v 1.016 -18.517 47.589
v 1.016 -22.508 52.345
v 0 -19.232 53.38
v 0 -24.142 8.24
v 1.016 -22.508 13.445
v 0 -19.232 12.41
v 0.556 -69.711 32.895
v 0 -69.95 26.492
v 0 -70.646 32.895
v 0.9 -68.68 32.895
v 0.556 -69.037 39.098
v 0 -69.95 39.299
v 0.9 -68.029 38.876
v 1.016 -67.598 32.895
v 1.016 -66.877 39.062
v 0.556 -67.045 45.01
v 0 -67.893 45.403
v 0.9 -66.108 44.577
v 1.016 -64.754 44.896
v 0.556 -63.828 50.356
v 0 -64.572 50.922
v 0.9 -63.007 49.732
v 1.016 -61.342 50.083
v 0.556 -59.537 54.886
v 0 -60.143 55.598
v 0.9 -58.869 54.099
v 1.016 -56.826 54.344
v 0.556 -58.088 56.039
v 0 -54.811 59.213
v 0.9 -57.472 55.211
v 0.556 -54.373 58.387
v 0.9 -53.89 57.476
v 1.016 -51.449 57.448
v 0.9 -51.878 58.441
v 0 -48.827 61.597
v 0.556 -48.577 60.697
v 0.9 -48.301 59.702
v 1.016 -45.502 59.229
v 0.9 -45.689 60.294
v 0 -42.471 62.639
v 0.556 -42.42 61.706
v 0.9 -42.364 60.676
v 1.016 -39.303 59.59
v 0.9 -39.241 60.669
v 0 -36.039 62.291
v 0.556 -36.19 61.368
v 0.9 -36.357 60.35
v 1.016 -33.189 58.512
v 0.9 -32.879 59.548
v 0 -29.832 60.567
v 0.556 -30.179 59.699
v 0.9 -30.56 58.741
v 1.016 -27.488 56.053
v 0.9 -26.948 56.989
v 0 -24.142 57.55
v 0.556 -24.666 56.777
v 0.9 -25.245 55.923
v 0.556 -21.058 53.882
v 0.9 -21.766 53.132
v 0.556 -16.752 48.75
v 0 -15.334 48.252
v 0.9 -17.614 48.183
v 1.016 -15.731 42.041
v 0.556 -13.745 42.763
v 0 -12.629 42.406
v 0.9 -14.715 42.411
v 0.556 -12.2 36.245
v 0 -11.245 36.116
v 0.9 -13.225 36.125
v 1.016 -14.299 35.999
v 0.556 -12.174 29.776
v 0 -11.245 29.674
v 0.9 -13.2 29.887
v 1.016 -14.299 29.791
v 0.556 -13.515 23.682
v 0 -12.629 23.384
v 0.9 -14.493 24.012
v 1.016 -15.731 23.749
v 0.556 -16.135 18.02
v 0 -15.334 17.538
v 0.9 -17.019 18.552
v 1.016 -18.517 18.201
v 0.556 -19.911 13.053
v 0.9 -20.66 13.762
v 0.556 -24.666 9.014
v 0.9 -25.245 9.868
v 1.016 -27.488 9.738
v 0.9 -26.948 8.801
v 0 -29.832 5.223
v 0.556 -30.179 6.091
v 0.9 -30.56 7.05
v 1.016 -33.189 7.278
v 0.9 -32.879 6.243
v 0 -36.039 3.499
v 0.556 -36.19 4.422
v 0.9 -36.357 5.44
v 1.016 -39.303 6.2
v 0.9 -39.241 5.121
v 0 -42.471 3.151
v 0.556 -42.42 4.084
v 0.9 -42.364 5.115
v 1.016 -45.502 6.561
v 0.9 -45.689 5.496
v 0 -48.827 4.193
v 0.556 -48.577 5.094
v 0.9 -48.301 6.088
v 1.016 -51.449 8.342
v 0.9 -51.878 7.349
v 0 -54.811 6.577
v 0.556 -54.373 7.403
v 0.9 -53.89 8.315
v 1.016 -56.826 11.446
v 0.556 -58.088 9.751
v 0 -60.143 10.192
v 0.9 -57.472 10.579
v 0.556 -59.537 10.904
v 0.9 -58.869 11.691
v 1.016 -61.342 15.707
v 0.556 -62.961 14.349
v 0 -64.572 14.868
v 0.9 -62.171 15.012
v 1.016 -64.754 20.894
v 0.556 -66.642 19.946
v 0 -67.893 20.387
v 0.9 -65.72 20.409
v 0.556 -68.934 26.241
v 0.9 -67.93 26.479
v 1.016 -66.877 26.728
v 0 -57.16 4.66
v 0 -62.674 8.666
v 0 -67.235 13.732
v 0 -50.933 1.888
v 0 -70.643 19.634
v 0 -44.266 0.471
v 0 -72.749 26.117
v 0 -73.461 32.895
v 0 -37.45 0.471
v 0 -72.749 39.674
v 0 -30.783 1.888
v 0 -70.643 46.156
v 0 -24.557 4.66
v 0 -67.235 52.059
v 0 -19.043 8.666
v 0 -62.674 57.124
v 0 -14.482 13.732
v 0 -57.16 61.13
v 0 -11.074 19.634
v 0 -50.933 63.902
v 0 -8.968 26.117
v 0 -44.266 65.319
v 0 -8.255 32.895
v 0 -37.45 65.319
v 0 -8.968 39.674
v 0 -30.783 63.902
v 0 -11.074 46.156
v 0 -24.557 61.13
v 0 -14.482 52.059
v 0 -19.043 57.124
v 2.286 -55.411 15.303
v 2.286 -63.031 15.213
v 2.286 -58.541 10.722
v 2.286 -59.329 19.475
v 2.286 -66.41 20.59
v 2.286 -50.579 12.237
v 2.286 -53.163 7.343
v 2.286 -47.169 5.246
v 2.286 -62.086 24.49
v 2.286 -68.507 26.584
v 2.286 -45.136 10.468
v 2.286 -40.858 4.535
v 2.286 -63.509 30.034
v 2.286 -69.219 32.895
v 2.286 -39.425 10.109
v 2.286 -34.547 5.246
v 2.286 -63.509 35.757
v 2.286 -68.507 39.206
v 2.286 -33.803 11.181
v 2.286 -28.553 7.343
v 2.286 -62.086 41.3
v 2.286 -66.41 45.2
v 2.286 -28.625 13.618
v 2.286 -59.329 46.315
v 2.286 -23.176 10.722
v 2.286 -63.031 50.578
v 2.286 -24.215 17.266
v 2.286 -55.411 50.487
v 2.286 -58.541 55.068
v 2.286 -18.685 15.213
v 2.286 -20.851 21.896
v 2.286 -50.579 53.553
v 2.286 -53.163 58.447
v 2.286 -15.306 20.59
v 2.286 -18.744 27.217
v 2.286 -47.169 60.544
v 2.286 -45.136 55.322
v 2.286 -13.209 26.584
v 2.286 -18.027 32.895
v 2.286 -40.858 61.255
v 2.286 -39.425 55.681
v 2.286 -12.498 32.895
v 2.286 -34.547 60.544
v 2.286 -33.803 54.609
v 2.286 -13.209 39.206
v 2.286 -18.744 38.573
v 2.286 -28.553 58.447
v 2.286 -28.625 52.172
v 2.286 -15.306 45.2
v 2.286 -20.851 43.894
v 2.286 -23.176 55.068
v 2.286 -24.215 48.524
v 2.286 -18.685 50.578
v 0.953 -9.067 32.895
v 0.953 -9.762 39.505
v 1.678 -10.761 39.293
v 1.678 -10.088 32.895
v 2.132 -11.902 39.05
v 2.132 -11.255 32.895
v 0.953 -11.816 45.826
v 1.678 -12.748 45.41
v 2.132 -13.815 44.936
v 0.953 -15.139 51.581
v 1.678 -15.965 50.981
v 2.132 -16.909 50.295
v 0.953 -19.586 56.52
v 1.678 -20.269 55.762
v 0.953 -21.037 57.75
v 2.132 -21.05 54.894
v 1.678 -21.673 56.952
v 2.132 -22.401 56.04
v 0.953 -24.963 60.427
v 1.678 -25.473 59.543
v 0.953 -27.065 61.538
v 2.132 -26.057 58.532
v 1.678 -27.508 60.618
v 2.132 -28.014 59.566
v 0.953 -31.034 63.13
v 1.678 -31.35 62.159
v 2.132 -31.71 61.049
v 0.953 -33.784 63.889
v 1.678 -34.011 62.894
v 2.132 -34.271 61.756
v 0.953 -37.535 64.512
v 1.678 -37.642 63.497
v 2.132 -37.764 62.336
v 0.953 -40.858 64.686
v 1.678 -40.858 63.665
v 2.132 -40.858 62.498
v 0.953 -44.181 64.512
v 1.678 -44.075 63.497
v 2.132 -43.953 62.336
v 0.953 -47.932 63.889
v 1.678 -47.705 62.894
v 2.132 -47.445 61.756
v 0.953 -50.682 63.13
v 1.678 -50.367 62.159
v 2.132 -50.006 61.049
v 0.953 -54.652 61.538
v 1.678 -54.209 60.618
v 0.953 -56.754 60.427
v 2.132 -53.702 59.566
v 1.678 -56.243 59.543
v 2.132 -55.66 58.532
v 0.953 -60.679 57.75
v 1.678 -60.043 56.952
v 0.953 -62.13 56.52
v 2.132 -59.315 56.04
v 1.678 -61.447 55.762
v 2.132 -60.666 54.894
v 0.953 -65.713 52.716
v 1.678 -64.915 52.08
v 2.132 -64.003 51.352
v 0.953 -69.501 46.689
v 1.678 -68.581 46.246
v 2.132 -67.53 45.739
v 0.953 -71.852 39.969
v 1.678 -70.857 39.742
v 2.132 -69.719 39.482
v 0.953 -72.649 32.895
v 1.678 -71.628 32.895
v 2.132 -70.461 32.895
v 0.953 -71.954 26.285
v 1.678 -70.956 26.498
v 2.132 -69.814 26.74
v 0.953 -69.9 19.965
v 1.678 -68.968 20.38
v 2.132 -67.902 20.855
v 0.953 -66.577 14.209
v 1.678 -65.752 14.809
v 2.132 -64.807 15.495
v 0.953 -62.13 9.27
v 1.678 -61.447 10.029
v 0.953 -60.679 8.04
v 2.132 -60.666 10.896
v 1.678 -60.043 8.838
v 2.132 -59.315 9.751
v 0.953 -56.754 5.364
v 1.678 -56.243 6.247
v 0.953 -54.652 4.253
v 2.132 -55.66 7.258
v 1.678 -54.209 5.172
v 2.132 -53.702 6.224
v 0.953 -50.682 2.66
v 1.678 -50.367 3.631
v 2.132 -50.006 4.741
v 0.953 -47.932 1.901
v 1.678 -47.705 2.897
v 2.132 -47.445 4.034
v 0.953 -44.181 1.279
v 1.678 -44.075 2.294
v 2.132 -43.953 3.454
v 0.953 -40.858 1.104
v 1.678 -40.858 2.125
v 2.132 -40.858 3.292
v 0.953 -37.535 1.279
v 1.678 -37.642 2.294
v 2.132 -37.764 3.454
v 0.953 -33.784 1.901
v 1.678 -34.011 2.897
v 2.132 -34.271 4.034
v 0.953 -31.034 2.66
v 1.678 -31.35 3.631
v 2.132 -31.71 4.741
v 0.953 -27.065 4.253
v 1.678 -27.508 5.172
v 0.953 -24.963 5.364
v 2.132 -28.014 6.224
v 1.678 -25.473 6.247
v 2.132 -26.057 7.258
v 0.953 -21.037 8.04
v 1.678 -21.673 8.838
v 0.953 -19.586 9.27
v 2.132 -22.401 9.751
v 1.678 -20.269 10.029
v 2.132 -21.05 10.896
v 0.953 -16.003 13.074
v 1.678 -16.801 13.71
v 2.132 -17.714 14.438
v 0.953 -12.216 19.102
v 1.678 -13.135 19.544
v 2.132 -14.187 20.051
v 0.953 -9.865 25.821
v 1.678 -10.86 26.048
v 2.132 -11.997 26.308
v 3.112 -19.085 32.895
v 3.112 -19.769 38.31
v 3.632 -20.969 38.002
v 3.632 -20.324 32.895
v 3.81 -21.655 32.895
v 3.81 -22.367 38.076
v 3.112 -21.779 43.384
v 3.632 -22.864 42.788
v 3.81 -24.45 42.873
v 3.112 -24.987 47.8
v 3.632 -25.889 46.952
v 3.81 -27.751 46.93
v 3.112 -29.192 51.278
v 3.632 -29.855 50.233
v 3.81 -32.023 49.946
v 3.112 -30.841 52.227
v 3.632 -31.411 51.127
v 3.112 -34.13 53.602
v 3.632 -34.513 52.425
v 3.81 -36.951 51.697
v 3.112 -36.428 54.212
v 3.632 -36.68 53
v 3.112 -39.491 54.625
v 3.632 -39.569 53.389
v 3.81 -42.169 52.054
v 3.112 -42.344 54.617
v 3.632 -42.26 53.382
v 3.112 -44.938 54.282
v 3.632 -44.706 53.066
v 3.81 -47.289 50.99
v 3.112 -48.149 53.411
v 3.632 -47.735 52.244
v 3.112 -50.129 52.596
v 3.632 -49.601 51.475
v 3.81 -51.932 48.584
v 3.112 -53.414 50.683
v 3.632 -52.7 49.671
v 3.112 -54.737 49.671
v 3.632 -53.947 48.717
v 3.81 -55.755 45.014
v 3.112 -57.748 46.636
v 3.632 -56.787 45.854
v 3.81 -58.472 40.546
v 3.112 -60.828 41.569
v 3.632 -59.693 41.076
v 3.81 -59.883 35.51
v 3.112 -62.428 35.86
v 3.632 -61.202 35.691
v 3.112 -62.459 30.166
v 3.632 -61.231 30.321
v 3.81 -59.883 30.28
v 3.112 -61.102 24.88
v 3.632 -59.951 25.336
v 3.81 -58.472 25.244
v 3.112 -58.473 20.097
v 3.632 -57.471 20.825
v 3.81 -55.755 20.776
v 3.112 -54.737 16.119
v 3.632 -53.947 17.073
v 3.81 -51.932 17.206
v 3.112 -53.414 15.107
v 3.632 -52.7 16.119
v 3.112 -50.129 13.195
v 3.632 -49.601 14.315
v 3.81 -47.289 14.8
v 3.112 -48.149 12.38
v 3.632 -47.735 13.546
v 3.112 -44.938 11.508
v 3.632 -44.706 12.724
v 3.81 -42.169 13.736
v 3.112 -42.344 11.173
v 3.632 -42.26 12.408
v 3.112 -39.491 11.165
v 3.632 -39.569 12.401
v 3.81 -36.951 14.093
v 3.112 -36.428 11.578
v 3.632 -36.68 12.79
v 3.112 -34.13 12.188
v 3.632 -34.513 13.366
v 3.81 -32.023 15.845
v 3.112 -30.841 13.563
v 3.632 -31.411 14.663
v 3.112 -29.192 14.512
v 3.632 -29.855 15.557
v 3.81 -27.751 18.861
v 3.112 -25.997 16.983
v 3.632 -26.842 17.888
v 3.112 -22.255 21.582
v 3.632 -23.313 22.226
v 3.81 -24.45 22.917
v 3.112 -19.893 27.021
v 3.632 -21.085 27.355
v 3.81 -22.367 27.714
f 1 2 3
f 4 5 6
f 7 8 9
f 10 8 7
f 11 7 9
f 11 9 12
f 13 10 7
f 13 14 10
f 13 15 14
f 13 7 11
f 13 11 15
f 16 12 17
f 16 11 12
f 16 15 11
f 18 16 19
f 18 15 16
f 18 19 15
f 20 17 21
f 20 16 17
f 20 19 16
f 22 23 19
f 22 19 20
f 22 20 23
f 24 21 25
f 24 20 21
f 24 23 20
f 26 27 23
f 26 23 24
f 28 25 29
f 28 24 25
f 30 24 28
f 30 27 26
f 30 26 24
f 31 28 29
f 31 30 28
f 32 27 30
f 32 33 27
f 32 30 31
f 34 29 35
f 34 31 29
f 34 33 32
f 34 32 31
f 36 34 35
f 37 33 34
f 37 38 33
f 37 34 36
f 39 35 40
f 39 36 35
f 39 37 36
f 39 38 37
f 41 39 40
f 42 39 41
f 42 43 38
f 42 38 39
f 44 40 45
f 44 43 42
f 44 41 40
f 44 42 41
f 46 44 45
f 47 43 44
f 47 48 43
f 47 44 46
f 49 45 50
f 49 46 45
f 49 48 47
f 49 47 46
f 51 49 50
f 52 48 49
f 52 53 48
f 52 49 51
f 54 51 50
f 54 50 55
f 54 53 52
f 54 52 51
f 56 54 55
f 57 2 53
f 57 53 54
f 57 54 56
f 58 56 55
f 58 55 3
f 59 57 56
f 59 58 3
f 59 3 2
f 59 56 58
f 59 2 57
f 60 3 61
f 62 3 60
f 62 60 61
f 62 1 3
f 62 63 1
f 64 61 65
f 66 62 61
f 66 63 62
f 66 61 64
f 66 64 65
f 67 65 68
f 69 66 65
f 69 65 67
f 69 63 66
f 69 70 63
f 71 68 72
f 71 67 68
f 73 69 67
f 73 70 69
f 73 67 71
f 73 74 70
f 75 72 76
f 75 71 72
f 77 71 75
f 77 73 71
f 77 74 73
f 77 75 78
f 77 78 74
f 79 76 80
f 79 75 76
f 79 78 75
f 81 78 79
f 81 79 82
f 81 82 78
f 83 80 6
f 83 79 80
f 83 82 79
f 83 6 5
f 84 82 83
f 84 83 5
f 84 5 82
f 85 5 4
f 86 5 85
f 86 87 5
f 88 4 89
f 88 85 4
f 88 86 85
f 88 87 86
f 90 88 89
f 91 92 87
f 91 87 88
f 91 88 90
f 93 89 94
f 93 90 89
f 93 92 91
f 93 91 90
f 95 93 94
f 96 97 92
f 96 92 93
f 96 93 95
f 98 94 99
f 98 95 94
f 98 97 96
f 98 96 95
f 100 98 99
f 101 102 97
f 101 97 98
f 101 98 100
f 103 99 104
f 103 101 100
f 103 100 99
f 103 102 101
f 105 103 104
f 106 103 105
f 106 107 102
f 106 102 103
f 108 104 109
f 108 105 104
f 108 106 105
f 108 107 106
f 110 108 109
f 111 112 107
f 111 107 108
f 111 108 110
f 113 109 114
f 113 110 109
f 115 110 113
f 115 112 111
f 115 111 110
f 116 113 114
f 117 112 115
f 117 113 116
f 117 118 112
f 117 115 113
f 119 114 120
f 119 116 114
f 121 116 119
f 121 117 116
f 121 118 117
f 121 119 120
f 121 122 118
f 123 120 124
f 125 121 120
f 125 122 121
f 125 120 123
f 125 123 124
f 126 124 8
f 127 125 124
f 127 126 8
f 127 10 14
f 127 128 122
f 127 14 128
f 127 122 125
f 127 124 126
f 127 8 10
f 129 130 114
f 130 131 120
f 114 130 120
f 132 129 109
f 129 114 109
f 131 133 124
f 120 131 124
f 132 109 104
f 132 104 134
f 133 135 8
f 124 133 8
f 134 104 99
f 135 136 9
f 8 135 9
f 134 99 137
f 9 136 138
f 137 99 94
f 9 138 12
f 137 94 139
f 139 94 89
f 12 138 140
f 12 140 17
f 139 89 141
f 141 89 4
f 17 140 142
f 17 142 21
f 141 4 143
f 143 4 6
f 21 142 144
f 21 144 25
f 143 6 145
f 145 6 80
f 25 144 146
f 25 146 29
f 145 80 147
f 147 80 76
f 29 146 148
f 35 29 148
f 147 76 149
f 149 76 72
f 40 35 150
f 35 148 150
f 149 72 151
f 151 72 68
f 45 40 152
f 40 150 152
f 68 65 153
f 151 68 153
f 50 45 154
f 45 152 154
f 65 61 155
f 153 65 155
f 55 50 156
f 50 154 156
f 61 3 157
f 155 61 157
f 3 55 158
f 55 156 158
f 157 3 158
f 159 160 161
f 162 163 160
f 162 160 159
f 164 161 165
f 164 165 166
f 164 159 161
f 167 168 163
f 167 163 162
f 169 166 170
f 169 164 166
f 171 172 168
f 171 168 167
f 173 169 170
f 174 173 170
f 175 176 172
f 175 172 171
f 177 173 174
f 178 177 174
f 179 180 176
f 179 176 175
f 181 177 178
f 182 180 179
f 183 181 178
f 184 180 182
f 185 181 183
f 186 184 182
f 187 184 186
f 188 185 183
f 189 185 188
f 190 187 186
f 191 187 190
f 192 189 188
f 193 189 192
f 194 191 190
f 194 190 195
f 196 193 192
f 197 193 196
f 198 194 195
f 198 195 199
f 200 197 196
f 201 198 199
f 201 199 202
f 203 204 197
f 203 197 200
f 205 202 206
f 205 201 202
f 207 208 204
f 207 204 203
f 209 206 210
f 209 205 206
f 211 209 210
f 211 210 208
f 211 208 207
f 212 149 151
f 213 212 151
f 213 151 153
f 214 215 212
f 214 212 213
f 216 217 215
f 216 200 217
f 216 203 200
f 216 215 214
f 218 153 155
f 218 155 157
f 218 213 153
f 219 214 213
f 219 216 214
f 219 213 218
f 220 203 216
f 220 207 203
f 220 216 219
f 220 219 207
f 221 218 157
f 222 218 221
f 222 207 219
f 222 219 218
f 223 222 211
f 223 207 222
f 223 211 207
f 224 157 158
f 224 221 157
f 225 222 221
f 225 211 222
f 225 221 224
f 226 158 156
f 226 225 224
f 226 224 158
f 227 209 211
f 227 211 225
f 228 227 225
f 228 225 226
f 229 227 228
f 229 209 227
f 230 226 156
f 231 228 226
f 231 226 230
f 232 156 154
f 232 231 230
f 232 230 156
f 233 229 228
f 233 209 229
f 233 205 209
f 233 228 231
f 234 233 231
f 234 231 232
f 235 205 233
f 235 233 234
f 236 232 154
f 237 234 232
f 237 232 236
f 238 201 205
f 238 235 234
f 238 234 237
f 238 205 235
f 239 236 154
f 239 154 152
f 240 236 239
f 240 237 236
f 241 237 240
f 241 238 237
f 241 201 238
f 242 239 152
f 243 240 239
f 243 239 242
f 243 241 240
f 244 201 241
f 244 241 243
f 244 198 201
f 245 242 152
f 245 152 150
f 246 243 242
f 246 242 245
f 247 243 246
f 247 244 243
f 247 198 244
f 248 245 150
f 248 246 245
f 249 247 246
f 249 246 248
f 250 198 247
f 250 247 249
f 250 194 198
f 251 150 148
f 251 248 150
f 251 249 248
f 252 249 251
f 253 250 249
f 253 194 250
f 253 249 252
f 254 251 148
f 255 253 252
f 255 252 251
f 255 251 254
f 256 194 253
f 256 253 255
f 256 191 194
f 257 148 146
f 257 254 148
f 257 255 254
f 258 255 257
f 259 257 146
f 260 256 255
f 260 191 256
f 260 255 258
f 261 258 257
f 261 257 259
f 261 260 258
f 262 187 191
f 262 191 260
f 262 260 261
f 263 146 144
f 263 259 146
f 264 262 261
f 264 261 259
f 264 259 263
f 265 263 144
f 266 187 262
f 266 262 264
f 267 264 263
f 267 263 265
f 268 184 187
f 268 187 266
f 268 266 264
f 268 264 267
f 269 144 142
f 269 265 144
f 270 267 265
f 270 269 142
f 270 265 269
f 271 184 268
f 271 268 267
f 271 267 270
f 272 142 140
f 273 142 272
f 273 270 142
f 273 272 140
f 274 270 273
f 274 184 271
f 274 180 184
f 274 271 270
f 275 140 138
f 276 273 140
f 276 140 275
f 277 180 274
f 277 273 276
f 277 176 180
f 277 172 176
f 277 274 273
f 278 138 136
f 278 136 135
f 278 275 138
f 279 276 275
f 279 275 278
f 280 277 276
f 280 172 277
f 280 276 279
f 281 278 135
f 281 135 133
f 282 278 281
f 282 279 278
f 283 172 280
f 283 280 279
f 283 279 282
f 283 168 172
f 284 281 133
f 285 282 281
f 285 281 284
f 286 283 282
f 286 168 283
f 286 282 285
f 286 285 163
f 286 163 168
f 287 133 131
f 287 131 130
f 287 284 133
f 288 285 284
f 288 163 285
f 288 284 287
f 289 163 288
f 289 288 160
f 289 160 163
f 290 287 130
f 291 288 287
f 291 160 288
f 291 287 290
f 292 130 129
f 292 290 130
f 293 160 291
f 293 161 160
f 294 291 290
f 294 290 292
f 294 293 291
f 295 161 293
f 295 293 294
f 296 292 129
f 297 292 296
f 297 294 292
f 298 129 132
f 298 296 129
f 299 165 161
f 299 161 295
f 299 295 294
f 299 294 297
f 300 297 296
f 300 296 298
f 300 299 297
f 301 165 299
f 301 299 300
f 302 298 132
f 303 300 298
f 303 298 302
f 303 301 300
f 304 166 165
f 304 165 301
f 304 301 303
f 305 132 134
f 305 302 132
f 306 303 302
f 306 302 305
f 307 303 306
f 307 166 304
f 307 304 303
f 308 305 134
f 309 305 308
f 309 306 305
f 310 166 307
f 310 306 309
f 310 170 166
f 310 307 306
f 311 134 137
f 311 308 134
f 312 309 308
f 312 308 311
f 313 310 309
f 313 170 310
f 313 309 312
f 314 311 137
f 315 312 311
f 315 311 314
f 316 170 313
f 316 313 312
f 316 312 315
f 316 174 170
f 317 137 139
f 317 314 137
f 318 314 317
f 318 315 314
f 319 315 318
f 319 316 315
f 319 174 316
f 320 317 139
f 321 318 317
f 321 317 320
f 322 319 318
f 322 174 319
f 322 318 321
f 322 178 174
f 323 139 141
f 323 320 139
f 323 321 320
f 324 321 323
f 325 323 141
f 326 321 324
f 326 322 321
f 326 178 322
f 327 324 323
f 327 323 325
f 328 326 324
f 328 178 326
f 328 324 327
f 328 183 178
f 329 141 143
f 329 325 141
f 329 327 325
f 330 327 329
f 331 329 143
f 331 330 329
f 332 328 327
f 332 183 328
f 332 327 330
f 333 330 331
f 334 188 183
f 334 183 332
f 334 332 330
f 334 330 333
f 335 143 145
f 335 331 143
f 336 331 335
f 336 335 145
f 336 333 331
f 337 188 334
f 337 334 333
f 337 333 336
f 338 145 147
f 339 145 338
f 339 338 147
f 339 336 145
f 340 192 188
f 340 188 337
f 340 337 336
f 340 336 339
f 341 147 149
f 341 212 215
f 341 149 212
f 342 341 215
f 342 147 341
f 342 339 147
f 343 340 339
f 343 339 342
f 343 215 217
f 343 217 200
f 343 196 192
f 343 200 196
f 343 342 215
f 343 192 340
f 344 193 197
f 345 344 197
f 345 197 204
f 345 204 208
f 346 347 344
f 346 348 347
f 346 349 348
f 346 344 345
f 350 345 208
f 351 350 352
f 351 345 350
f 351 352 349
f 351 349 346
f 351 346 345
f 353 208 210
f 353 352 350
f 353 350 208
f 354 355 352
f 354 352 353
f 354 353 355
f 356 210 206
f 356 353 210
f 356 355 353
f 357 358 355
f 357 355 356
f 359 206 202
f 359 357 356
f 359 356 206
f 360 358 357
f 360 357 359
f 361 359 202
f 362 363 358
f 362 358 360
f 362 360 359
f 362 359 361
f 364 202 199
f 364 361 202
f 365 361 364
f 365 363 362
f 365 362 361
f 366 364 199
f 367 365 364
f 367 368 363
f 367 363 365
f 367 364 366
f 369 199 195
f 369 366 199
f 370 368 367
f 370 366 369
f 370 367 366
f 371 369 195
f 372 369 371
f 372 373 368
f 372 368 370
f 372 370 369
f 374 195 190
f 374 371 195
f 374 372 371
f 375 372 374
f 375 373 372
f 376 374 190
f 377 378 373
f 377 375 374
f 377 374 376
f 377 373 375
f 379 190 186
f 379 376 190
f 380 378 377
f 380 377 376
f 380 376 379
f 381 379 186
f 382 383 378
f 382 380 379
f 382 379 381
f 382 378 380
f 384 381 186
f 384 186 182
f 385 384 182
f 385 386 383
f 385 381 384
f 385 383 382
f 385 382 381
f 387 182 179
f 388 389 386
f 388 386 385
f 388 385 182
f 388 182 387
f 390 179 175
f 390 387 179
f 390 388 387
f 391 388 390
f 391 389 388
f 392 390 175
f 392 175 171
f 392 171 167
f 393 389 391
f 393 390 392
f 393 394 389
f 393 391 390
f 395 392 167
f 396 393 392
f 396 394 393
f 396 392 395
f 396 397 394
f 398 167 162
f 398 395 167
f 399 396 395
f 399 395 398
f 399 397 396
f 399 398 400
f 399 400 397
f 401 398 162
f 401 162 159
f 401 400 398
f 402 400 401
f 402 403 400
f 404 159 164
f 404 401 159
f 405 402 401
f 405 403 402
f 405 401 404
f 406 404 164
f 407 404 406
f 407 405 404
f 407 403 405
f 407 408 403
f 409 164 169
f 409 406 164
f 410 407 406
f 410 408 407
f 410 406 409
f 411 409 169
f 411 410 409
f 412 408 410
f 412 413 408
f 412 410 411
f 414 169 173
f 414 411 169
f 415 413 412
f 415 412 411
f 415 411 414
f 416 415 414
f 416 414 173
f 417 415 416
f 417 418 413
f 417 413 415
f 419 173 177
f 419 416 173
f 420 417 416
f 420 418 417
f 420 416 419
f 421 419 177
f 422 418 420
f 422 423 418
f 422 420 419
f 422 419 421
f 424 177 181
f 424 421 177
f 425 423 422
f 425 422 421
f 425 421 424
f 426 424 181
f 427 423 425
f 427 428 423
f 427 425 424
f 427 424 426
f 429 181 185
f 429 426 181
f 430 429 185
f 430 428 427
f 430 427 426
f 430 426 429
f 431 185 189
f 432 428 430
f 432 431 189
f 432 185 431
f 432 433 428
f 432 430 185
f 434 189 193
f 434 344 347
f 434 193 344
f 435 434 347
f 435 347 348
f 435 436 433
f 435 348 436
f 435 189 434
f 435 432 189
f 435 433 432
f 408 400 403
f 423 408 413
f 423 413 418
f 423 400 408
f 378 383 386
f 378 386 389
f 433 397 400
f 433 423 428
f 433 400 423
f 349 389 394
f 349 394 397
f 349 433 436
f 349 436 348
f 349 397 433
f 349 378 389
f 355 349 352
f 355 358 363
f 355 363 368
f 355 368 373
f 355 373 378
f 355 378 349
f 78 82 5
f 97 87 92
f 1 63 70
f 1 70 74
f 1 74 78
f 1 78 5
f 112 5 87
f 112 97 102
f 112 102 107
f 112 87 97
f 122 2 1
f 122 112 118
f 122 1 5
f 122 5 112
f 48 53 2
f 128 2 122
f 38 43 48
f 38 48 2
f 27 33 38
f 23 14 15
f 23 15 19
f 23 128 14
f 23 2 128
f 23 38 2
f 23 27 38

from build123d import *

# Parameters (mm, degrees)
F0_R     = 32.6029937505
F1_DEPTH = 2.286
F2_R     = 22.8313061555
F3_DEPTH = 1.524
F6_R     = 29.7880355639
F7_DEPTH = 1.016


# Not quite as in the source:
# - a fillet or chamfer that OpenCascade refuses, or shapes differently, is made with other operations: its cross-section is extruded or revolved along the edge and cut away or added


with BuildPart() as f1:
    # F0 (on Right) → F1 (new body)
    with BuildSketch(Plane.YZ):
        with Locations((-40.8581867814, 32.8951068223)):
            Circle(F0_R)
    extrude(amount=F1_DEPTH)

    # F2 (on face) → F3 (join)
    with BuildSketch(Plane.YZ.offset(2.286)):
        with Locations((-40.8581867814, 32.8951068223)):
            Circle(F2_R)
    extrude(amount=F3_DEPTH)

    # F4: fillet of radius 5.08 on 1 edges, made by hand

    # F4_s1 → F4_t2 (revolve, cut)
    with BuildSketch(Plane.XY.offset(32.8951068223)):
        with BuildLine():
            ThreePointArc((2.286, -18.0268806259), (3.4135285843, -19.6872507278), (3.81, -21.6547262676))
            Line((3.81, -21.6547262676), (3.81, -18.0268806259))
            Line((3.81, -18.0268806259), (2.286, -18.0268806259))
        make_face()
    revolve(axis=Axis((3.81, -40.8581867814, 32.8951068223), (1, 0, 0)), mode=Mode.SUBTRACT)

    # F5: fillet of radius 5.08 on 1 edges, made by hand

    # F5_s1 → F5_t2 (revolve, cut)
    with BuildSketch(Plane.XY.offset(32.8951068223)):
        with BuildLine():
            ThreePointArc((0, -8.2551930309), (1.6781314829, -10.0881738983), (2.286, -12.4978294754))
            Line((2.286, -12.4978294754), (2.286, -8.2551930309))
            Line((2.286, -8.2551930309), (0, -8.2551930309))
        make_face()
    revolve(axis=Axis((2.286, -40.8581867814, 32.8951068223), (1, 0, 0)), mode=Mode.SUBTRACT)

    # F6 (on face) → F7 (cut)
    with BuildSketch(Plane(origin=(0, 0, 0), x_dir=(0, -1, 0), z_dir=(-1, 0, 0))):
        with Locations((40.8581867814, 32.8951068223)):
            Circle(F6_R)
    extrude(amount=-F7_DEPTH, mode=Mode.SUBTRACT)

    # F8: fillet of radius 5.08 on 1 edges, made by hand

    # F8_s1 → F8_t2 (revolve)
    with BuildSketch(Plane.XY.offset(32.8951068223)):
        with BuildLine():
            ThreePointArc((0, -70.6462223453), (0.7553111541, -69.2046593967), (1.016, -67.5982223453))
            Line((1.016, -67.5982223453), (1.016, -70.6462223453))
            Line((1.016, -70.6462223453), (0, -70.6462223453))
        make_face()
    revolve(axis=Axis((1.016, -40.8581867814, 32.8951068223), (-1, 0, 0)))


solid = f1.part
